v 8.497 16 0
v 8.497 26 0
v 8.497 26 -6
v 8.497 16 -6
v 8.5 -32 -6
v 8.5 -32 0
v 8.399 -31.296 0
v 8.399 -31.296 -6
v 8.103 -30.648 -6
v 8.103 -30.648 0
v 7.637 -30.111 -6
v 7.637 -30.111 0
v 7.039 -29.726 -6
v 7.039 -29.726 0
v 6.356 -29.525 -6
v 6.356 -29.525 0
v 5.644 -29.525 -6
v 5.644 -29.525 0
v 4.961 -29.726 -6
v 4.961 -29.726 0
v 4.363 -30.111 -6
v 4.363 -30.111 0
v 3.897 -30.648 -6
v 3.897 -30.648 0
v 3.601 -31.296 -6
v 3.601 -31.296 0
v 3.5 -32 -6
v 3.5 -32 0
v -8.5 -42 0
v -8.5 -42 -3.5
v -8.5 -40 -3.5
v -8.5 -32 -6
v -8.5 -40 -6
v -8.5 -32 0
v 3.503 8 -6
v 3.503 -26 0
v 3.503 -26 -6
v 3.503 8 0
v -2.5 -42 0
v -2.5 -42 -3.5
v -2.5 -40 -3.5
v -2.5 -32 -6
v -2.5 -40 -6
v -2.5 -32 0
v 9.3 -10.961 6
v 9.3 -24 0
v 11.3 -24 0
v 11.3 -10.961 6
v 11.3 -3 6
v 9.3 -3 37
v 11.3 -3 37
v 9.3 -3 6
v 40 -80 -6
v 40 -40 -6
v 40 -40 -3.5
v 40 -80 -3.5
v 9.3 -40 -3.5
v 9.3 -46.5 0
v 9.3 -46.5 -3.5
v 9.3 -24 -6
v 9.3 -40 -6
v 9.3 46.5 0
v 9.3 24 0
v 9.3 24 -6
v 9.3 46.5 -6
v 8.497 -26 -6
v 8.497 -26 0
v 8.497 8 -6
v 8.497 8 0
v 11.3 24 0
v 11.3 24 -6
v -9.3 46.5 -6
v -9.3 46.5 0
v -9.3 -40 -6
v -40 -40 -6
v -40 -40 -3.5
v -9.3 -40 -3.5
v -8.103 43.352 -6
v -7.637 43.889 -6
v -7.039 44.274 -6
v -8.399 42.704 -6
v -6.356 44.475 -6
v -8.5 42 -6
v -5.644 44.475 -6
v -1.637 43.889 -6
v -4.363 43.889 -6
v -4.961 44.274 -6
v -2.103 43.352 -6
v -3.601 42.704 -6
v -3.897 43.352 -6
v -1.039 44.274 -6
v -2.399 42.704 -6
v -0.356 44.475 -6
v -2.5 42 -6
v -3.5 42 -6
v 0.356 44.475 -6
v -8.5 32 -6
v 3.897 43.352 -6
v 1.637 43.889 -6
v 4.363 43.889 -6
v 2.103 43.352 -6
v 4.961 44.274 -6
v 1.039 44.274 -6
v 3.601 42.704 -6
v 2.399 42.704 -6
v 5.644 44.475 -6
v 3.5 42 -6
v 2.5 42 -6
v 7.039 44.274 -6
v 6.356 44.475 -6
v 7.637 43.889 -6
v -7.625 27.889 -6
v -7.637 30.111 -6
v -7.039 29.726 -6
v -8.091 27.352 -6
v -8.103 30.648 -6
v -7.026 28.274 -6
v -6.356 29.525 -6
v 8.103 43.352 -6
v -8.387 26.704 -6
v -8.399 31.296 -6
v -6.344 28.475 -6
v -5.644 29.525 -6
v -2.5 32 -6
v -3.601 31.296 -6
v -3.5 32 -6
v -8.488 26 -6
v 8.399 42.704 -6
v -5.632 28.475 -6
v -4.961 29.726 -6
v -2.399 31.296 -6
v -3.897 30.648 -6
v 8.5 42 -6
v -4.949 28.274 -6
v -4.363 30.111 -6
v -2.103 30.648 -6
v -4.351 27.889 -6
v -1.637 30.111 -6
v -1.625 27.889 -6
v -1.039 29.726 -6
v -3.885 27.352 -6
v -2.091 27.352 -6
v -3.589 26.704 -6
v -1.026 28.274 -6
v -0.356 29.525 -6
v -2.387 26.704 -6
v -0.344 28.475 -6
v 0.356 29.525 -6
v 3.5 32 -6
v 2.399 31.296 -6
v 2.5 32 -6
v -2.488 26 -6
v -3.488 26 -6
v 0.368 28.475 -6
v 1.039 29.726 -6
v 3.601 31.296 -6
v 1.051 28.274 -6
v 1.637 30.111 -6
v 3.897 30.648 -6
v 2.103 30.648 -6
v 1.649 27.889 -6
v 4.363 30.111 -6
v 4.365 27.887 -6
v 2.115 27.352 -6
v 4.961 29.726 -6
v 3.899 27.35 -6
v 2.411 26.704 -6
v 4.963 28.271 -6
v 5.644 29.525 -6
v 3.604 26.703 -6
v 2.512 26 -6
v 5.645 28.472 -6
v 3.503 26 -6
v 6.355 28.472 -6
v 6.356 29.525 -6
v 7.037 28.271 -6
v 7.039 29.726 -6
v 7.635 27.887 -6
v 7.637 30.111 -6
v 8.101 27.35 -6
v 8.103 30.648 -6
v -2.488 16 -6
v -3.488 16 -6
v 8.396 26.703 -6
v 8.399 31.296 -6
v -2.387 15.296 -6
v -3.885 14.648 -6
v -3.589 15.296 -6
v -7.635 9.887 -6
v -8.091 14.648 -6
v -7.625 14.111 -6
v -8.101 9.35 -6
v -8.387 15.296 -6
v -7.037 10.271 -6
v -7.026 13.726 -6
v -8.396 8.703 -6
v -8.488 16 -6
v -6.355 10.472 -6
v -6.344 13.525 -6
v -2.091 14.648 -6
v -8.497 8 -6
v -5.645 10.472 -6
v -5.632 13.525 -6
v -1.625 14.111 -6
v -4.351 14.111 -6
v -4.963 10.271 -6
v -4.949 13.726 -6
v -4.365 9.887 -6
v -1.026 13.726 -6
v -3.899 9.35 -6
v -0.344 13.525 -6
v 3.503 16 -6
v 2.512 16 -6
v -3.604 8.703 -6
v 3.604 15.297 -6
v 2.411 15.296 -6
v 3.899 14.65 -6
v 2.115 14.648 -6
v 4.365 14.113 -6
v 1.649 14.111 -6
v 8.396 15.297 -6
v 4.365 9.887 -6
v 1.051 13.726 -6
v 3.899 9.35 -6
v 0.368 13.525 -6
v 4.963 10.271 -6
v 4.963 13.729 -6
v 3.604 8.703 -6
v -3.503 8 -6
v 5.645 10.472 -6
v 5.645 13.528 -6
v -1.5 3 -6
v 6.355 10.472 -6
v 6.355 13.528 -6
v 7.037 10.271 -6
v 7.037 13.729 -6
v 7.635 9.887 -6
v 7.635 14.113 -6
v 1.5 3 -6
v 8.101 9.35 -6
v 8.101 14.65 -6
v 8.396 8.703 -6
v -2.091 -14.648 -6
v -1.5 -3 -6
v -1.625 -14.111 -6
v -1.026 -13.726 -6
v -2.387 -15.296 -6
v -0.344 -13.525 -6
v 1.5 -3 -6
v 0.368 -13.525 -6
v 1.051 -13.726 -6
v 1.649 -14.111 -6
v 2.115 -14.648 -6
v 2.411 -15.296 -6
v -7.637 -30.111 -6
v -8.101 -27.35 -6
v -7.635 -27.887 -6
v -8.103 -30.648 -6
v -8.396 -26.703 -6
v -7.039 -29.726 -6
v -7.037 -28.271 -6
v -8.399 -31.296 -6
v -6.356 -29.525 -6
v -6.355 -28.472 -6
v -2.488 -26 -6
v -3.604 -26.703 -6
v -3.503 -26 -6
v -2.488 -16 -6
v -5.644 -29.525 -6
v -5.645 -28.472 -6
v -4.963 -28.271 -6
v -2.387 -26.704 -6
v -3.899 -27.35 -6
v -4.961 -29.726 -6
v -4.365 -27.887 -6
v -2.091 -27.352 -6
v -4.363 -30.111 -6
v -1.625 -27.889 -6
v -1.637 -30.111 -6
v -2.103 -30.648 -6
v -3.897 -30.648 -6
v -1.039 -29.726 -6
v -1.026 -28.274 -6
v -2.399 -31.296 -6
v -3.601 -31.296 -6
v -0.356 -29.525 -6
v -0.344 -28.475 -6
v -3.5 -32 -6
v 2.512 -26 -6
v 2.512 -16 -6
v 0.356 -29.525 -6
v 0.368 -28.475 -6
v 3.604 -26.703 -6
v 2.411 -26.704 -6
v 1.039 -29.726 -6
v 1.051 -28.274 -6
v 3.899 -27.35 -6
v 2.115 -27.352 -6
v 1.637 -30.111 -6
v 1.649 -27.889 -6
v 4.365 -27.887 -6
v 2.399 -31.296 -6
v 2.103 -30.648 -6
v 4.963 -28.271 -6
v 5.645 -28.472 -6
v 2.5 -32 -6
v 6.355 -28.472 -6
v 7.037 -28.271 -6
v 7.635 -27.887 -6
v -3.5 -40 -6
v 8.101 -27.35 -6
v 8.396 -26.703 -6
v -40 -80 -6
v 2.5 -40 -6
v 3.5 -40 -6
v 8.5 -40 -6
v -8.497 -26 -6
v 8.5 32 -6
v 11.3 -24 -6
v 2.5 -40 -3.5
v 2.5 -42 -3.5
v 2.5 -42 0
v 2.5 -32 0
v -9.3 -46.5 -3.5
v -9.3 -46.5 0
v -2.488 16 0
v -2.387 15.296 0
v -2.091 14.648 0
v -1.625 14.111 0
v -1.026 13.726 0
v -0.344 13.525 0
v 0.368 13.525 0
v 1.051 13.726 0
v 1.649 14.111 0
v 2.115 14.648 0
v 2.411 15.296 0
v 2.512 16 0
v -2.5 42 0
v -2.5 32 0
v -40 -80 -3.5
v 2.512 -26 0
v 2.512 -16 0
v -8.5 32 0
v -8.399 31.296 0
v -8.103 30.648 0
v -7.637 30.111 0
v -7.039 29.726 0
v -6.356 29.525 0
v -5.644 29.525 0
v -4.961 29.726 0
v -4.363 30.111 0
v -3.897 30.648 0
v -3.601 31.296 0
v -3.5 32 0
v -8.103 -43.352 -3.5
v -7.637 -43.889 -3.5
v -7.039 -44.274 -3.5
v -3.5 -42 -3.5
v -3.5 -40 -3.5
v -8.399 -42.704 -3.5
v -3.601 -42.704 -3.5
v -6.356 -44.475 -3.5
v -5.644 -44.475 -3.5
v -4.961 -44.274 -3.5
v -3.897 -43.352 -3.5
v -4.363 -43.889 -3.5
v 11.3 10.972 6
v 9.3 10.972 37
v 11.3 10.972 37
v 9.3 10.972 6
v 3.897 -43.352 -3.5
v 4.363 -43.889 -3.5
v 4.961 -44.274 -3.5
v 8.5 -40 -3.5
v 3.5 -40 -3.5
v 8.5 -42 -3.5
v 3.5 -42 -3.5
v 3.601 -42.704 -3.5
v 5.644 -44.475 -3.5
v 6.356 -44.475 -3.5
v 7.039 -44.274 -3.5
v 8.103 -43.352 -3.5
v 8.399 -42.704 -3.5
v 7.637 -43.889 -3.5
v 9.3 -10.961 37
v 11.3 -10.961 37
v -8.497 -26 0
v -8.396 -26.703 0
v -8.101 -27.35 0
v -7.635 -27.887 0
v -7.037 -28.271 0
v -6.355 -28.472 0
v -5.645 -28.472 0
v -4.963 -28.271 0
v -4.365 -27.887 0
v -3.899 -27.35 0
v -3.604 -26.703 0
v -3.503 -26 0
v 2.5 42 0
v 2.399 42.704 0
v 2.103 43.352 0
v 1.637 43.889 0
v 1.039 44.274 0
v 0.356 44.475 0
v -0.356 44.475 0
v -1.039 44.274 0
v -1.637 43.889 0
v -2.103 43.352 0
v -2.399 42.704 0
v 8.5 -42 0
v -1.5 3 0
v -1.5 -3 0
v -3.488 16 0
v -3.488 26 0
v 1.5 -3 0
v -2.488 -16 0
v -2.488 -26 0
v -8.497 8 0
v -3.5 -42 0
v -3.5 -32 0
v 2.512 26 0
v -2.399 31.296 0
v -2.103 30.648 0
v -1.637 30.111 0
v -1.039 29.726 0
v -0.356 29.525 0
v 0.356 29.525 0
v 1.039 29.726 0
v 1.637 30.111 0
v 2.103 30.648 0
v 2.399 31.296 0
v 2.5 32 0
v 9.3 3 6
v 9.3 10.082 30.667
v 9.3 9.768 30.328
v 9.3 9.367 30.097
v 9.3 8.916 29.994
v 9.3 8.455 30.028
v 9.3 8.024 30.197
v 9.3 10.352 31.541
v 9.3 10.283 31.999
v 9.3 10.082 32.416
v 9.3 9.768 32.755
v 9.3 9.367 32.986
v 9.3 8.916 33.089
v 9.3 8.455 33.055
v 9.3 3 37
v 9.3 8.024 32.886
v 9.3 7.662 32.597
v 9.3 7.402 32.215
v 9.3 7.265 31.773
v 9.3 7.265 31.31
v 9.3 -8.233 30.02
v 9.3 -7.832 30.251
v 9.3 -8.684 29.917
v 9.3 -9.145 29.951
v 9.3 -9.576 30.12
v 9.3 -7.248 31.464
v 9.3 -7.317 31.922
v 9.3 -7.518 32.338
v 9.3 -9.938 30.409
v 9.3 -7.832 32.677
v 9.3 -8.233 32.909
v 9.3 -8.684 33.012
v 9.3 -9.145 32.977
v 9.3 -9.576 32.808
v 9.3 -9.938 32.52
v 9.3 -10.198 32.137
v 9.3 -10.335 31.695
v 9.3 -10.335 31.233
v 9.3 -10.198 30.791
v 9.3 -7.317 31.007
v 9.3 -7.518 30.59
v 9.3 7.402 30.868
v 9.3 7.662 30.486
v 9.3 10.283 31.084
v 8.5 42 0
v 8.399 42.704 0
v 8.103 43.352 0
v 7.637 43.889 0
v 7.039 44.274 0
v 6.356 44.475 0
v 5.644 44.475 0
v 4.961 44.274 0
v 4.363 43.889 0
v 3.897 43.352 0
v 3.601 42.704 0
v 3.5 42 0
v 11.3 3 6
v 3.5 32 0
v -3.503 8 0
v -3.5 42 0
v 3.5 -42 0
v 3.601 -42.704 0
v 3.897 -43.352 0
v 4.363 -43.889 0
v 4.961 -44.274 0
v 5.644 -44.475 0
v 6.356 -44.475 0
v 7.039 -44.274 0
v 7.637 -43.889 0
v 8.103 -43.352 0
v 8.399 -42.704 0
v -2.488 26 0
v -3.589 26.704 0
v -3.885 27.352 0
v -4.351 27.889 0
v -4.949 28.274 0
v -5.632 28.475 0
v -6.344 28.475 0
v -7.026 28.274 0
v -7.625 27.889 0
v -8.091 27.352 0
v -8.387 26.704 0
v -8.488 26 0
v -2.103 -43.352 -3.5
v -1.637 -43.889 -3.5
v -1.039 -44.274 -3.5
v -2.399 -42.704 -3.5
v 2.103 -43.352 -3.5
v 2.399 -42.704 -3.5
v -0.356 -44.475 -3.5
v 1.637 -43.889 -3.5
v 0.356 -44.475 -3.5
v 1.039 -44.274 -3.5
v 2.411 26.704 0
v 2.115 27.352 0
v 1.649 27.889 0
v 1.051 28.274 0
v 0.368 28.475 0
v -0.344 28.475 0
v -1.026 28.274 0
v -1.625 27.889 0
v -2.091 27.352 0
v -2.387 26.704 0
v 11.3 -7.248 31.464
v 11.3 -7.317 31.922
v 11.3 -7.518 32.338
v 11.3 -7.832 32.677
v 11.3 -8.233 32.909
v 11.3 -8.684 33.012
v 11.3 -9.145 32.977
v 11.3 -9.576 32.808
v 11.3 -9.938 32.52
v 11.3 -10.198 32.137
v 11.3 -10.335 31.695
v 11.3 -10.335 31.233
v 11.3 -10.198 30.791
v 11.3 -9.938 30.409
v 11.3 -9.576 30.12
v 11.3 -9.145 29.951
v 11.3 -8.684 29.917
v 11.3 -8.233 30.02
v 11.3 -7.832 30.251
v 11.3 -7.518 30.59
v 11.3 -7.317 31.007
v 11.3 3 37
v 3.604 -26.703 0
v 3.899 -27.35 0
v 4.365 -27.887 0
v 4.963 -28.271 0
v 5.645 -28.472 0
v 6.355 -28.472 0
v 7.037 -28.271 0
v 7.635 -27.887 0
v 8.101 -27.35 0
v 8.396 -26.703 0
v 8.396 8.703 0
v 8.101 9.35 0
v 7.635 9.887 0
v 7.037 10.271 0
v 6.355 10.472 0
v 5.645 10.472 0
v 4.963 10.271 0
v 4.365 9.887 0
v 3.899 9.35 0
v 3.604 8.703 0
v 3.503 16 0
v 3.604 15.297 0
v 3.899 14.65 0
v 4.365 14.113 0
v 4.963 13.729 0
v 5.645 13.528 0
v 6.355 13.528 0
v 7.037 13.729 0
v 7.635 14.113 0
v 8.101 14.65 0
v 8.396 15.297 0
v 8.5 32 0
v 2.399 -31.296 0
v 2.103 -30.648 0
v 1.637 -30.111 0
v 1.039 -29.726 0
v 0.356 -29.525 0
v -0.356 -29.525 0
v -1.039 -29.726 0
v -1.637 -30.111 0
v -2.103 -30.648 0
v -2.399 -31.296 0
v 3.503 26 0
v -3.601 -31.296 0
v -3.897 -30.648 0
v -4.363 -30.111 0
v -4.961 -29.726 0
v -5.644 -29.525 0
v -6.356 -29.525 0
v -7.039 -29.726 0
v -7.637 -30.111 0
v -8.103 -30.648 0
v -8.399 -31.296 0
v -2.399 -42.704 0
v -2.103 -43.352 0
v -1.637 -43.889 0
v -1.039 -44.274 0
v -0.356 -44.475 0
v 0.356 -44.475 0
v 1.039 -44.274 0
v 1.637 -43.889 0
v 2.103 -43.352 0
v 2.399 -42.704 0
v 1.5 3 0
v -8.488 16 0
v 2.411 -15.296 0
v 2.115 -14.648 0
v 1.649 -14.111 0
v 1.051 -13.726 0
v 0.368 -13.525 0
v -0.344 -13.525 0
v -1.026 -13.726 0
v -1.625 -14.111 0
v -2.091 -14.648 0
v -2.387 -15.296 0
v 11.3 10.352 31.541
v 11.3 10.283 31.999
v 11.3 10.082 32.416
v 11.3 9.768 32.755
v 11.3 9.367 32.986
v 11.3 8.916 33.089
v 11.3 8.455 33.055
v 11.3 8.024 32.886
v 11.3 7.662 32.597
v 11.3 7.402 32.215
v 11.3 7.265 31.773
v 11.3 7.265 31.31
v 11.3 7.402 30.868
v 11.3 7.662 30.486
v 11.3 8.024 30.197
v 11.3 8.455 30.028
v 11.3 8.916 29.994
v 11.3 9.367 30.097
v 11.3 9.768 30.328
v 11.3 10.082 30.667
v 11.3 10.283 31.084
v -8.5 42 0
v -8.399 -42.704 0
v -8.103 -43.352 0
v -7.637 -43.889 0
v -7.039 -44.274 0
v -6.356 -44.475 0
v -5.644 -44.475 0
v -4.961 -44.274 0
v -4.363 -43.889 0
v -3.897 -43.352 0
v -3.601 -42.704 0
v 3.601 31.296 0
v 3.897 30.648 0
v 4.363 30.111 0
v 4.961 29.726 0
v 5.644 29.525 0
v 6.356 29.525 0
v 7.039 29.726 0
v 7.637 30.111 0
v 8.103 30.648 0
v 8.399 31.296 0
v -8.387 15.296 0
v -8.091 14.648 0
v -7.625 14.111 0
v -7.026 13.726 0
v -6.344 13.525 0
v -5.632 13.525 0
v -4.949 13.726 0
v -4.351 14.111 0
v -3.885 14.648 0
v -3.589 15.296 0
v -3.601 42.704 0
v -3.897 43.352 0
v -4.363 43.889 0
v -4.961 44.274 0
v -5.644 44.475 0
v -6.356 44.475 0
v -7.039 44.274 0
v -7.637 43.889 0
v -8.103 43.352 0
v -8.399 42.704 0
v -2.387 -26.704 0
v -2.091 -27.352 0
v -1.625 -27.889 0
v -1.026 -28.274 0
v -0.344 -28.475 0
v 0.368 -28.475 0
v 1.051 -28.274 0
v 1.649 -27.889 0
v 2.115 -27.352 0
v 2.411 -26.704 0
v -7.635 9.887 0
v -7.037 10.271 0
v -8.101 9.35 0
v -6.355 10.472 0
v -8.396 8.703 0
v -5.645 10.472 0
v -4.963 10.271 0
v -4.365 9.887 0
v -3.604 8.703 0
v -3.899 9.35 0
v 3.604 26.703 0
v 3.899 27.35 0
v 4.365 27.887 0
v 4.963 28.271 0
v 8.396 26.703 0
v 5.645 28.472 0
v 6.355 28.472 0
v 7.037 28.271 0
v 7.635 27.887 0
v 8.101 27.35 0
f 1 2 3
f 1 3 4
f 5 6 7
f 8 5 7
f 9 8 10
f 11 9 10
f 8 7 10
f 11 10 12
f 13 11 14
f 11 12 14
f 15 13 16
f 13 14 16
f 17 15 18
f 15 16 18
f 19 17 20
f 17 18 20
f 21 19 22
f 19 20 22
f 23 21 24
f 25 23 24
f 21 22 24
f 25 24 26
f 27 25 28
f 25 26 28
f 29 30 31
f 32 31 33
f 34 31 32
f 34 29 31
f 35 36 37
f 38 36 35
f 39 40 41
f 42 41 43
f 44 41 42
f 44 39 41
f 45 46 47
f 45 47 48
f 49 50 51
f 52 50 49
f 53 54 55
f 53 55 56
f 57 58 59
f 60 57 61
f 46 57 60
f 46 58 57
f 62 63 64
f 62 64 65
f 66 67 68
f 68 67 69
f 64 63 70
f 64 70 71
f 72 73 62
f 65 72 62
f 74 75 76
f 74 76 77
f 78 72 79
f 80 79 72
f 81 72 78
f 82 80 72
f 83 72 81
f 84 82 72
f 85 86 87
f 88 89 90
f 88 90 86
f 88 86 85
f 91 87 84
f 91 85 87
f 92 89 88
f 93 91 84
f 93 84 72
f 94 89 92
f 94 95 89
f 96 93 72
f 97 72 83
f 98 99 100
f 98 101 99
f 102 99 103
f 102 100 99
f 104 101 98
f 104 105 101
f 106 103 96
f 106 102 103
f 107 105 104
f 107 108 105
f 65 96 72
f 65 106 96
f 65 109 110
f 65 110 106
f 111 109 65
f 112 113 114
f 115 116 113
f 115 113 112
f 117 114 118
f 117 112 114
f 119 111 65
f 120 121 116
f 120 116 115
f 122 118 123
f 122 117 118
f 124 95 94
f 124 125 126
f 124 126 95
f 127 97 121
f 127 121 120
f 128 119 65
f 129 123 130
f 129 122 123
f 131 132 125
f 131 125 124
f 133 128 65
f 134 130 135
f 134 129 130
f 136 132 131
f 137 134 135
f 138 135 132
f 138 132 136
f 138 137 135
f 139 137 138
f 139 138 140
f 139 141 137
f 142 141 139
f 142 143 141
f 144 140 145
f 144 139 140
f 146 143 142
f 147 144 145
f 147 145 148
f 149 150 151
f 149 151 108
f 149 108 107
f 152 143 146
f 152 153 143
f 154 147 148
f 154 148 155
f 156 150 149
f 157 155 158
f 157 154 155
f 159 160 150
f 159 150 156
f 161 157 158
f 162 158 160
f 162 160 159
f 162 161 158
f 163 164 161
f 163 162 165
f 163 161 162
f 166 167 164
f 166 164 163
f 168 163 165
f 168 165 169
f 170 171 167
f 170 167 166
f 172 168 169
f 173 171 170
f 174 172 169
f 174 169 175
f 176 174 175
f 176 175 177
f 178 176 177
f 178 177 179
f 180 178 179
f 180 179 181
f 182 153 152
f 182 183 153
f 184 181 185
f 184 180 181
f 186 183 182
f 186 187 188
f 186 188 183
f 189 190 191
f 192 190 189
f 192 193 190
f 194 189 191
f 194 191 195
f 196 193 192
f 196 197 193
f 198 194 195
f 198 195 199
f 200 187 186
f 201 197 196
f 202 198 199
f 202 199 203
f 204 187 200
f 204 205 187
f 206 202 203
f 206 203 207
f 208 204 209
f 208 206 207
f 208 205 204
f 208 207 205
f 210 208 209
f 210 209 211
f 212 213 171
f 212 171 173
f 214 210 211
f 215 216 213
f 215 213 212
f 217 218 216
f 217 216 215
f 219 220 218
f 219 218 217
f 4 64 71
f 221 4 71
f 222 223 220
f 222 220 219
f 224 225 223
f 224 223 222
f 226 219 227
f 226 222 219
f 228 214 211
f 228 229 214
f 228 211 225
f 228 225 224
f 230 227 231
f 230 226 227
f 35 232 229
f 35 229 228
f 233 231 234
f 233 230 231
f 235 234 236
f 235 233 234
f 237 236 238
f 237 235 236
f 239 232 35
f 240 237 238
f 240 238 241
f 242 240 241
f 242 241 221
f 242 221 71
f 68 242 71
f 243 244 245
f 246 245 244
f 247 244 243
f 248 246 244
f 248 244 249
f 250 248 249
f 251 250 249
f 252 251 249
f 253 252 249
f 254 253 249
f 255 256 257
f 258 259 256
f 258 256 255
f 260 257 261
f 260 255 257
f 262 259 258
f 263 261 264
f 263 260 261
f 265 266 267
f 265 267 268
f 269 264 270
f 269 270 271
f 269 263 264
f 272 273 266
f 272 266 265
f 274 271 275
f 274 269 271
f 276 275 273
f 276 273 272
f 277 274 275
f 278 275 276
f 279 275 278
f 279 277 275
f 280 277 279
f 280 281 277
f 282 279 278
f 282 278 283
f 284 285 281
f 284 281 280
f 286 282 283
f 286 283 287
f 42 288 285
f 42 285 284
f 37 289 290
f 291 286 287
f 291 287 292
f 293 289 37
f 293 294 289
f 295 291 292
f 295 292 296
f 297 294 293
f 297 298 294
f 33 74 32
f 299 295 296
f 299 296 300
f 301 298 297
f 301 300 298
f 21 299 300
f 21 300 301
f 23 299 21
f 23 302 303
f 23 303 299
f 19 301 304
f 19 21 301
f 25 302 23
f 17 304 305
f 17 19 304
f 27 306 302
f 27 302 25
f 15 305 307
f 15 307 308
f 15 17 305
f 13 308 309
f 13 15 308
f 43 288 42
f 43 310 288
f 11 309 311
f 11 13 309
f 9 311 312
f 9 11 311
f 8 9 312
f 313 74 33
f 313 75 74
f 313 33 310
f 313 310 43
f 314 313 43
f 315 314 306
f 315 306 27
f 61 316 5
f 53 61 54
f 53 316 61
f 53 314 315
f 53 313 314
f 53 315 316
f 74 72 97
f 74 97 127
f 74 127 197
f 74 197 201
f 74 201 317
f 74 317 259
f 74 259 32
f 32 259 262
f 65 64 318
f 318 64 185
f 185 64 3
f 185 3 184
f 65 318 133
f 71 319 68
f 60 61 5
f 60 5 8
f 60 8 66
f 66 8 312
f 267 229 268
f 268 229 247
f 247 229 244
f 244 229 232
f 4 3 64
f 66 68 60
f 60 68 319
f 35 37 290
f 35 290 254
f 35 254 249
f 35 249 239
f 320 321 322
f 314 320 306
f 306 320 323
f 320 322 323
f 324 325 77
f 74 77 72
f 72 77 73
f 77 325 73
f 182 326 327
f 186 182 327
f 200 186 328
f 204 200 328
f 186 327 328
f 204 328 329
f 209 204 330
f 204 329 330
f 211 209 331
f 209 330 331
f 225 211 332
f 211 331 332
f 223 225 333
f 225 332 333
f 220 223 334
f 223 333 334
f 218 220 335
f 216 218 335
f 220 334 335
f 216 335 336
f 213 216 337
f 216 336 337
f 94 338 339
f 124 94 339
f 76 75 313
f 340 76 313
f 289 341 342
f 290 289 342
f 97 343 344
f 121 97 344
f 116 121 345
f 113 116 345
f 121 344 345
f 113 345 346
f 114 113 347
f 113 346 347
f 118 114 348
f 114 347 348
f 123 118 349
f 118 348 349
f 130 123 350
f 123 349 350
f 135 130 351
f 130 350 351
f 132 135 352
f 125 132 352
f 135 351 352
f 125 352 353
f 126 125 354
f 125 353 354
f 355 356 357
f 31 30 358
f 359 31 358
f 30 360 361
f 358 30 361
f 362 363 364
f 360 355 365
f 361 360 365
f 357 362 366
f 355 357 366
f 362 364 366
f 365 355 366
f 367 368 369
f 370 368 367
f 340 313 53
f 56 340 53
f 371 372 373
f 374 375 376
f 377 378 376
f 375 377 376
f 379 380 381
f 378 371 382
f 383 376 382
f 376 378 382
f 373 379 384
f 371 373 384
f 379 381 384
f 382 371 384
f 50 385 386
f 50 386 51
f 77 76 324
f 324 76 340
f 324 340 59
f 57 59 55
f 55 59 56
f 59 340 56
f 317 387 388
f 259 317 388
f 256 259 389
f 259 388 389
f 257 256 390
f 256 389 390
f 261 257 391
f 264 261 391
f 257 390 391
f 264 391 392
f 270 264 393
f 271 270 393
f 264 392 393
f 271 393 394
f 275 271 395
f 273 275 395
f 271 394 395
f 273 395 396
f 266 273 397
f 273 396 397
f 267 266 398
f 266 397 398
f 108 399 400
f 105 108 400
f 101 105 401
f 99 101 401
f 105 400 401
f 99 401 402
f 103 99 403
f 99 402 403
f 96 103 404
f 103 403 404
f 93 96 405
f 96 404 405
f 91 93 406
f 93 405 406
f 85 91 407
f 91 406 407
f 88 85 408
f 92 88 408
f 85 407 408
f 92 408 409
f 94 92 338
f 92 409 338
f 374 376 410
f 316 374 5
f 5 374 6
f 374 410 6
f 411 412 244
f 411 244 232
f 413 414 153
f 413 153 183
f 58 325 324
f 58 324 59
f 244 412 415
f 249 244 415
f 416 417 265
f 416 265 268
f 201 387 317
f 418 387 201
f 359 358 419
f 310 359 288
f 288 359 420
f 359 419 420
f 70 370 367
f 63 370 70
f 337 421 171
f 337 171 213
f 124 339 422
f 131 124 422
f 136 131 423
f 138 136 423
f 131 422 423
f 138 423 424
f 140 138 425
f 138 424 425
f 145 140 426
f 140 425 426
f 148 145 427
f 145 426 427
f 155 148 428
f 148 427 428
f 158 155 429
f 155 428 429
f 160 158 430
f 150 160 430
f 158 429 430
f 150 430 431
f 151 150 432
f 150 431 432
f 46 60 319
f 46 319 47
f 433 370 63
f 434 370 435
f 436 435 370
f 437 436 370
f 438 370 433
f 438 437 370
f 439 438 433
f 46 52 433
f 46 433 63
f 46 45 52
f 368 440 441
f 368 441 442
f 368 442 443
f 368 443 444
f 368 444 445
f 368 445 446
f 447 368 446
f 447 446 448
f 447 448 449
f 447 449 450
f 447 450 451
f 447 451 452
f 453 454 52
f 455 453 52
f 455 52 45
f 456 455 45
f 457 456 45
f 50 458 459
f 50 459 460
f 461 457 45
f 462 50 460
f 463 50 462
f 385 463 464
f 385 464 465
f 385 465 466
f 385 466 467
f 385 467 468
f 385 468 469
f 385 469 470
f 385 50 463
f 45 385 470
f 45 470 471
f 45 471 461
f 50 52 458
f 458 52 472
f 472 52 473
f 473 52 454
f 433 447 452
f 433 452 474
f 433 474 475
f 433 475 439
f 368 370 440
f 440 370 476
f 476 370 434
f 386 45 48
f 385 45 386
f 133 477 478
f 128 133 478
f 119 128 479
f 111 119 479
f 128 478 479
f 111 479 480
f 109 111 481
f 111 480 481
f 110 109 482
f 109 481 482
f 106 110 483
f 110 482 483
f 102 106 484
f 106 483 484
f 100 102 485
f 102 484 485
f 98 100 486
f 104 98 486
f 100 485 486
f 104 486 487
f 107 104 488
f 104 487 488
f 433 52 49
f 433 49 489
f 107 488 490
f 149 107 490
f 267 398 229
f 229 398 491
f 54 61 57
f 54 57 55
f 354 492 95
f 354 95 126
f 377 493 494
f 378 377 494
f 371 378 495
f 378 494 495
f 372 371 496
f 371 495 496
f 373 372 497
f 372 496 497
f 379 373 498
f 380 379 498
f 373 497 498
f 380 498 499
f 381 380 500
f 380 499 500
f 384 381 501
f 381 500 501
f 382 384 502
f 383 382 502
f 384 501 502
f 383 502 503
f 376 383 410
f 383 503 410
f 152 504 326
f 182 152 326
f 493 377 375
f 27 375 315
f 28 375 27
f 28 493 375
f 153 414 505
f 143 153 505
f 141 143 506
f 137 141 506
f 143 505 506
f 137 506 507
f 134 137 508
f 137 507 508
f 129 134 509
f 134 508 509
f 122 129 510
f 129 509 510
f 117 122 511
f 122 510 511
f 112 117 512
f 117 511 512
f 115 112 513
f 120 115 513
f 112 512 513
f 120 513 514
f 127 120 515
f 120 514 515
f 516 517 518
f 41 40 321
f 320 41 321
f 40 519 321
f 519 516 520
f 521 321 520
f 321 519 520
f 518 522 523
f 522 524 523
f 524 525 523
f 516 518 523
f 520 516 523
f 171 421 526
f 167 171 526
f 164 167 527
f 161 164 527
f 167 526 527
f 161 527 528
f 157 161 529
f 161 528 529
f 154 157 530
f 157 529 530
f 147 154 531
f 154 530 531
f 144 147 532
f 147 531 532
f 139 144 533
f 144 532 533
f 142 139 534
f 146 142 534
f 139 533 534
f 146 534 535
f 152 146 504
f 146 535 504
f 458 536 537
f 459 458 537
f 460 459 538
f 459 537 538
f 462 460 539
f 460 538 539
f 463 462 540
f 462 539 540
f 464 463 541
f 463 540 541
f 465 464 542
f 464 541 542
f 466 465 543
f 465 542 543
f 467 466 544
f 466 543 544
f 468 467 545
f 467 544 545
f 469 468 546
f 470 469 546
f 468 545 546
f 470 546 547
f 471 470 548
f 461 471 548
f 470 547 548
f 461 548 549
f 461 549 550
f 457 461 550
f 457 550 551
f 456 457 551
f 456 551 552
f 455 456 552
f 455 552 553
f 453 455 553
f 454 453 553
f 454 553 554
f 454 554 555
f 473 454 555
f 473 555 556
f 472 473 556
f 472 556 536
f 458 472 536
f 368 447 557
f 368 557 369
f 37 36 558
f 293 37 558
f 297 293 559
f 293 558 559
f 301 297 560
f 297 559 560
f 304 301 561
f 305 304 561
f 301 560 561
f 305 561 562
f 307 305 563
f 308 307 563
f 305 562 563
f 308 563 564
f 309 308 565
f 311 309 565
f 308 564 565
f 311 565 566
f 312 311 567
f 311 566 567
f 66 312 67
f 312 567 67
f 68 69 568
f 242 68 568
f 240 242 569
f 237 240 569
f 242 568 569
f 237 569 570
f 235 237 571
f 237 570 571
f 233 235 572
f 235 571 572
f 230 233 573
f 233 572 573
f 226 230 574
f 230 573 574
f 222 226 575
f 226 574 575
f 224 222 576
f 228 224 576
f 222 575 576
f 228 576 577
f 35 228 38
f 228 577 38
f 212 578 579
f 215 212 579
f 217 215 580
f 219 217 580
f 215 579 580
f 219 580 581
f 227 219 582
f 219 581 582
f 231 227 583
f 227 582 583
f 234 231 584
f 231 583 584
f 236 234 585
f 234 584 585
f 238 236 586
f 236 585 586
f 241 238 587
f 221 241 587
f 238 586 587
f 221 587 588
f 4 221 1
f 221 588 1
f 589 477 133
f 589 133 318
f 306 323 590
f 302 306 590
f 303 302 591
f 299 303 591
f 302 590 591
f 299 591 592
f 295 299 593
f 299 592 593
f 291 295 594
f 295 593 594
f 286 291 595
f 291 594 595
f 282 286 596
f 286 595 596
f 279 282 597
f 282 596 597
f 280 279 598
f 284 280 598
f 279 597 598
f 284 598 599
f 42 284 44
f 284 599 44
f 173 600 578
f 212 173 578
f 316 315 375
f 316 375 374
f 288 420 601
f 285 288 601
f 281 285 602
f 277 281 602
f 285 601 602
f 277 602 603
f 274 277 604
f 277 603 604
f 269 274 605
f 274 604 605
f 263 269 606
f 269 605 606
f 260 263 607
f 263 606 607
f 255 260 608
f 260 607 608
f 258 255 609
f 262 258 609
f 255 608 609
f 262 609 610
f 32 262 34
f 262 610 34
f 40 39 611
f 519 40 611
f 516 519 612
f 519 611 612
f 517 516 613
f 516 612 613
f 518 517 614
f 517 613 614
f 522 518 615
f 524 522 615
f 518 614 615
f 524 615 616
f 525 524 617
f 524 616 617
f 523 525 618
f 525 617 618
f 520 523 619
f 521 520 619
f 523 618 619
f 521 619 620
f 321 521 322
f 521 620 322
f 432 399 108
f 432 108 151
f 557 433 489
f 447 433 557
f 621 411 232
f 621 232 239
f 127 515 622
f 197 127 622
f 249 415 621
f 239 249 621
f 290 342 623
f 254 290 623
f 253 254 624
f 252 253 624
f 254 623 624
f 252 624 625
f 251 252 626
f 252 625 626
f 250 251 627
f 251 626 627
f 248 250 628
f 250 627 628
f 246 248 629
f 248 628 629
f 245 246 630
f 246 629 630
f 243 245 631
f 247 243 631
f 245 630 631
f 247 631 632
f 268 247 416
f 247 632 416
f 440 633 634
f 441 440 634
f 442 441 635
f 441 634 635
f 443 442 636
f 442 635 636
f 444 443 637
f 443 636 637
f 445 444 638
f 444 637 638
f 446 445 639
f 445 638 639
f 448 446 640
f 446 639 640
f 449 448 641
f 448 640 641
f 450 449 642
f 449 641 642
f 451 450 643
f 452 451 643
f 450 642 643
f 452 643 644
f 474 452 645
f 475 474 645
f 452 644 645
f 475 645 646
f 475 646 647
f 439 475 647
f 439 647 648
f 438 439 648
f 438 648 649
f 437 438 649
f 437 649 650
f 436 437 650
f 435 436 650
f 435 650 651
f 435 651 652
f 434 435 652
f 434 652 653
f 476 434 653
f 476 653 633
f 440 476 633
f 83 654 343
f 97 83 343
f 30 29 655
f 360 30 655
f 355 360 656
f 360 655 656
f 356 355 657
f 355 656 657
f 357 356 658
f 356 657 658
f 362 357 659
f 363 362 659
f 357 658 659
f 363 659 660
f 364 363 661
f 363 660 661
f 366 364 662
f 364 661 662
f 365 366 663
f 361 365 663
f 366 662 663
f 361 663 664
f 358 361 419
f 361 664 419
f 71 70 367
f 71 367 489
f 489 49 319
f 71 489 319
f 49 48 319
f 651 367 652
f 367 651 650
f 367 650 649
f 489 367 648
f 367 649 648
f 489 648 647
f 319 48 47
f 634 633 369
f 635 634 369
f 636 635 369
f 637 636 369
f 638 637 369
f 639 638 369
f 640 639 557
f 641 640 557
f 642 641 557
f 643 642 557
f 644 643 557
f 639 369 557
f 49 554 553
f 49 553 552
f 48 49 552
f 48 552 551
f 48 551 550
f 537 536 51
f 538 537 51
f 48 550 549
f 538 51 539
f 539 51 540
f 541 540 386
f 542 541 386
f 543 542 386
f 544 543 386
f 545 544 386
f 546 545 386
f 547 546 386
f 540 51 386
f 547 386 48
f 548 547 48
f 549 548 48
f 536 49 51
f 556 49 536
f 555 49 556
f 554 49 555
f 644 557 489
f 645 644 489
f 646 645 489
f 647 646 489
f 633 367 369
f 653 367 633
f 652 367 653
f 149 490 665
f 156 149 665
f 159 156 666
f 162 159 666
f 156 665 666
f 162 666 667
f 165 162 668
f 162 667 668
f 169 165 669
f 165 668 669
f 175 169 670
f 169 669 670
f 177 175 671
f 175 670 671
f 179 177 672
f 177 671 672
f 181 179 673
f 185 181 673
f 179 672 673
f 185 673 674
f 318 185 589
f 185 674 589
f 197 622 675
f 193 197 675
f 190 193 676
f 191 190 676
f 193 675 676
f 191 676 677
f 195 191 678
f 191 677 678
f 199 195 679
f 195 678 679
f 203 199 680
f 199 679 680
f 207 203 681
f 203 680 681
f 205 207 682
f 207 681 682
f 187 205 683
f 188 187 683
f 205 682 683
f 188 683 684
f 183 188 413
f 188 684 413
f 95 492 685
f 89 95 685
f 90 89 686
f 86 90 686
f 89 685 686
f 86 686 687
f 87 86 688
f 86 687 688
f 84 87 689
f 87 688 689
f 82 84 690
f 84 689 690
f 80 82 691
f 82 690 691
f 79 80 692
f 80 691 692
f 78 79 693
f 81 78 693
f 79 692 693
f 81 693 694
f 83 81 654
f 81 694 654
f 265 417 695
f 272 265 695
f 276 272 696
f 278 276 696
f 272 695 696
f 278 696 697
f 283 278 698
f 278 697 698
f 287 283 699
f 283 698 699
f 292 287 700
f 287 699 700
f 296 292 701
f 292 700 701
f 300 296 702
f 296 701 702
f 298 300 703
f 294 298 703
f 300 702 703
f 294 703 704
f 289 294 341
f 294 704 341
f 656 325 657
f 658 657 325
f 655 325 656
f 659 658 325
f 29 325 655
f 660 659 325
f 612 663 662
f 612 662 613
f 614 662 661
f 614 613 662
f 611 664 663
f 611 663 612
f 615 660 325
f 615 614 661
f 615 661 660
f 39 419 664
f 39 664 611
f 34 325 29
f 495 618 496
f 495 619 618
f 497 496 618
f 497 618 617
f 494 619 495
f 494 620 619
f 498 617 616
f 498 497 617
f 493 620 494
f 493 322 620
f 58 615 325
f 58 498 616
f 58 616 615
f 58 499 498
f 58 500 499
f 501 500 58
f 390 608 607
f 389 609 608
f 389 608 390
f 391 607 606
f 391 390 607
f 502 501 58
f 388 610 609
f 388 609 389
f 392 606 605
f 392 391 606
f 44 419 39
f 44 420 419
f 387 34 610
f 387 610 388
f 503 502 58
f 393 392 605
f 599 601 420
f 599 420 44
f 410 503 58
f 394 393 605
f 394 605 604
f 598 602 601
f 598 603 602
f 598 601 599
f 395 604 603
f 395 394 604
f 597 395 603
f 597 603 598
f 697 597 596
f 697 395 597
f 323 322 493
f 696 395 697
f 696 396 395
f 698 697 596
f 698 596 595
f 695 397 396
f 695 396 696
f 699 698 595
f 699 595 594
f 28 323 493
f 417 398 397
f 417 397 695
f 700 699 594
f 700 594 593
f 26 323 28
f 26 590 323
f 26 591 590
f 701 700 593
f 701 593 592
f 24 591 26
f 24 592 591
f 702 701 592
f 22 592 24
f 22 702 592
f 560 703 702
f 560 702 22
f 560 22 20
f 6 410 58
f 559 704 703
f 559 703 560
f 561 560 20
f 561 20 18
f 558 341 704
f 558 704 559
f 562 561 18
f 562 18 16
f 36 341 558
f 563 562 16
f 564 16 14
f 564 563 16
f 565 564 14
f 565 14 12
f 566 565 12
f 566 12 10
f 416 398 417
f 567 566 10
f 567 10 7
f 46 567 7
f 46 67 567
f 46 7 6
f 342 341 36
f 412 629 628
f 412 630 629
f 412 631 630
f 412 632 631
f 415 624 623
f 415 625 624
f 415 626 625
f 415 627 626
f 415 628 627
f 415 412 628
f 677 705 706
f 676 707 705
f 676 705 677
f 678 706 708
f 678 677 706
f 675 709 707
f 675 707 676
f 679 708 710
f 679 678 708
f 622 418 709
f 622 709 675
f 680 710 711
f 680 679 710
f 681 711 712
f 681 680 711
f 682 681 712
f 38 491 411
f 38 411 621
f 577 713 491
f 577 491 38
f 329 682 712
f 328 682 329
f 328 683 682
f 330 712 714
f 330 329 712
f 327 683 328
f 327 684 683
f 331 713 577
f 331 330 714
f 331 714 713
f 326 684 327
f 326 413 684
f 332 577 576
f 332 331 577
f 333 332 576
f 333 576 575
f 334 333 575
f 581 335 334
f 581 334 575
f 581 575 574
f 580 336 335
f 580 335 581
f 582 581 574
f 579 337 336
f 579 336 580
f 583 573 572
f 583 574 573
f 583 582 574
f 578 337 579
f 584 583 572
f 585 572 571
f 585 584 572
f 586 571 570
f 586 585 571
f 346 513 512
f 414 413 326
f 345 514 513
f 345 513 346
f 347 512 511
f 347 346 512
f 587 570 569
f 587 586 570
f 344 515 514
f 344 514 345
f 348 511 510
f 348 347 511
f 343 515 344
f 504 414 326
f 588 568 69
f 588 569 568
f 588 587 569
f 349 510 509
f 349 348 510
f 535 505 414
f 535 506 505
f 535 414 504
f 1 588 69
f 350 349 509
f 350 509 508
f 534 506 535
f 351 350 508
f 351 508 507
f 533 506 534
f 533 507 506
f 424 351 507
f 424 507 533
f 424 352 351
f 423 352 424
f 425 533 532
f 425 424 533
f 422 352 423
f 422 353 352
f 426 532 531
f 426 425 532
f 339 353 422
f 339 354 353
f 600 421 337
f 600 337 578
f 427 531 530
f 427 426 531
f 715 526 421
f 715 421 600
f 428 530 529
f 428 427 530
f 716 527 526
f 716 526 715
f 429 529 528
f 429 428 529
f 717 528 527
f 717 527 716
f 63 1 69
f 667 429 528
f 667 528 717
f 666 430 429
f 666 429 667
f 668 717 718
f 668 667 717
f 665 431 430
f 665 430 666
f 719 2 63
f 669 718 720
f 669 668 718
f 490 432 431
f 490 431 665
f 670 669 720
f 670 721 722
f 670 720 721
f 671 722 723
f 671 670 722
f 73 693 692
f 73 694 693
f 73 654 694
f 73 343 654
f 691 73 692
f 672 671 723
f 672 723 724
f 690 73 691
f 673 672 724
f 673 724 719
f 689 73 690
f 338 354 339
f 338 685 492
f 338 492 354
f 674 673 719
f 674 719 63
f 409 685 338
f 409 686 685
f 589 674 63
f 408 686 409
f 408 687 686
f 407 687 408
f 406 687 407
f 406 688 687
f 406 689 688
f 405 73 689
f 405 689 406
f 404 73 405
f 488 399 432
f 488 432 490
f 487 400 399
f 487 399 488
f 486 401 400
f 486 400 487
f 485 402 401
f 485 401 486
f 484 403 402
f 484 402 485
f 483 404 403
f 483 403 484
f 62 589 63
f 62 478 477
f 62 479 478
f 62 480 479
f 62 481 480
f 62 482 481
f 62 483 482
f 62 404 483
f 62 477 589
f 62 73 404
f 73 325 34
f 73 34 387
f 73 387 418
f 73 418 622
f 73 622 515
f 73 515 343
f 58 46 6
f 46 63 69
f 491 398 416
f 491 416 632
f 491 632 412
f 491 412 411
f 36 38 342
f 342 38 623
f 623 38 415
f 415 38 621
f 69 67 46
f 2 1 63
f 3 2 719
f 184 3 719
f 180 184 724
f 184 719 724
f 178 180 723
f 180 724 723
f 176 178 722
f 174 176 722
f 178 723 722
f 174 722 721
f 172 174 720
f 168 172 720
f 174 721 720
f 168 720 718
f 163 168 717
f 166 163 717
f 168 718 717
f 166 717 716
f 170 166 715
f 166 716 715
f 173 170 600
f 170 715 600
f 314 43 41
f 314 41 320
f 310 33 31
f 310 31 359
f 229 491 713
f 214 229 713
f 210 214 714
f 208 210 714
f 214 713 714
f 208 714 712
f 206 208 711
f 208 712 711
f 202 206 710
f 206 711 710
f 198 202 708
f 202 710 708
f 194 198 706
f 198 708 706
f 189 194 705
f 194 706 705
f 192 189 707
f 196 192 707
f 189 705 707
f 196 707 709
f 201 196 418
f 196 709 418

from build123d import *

# Parameters (mm, degrees)
SKETCH_W        = 18.6
SKETCH_H        = 93
PAD_DEPTH       = 6
SKETCH001_W     = 3
SKETCH001_H     = 6
POCKET_DEPTH    = 6
POCKET001_DEPTH = 8
PAD001_DEPTH    = 2
SKETCH004_R     = 1.551846
SKETCH004_R_2   = 1.552141
POCKET002_DEPTH = 55
SKETCH005_W     = 80
SKETCH005_H     = 40
PAD002_DEPTH    = 2.5


with BuildPart() as part:
    # Sketch → Pad (new body)
    with BuildSketch(Plane.XY):
        Rectangle(SKETCH_W, SKETCH_H)
    extrude(amount=-PAD_DEPTH)

    # Sketch001 (on Face5 of Pad) → Pocket (cut)
    with BuildSketch(Plane.XY):
        Rectangle(SKETCH001_W, SKETCH001_H)
    extrude(amount=-POCKET_DEPTH, mode=Mode.SUBTRACT)

    # Sketch002 (on Face4 of Pocket) → Pocket001 (cut)
    with BuildSketch(Plane.XY):
        with BuildLine():
            ThreePointArc((-2.5, -42), (0, -44.5), (2.5, -42))
            Line((2.5, -42), (2.5, -32))
            ThreePointArc((2.5, -32), (0, -29.5), (-2.5, -32))
            Line((-2.5, -42), (-2.5, -32))
        make_face()
        with BuildLine():
            ThreePointArc((-8.5, -42), (-6, -44.5), (-3.5, -42))
            Line((-3.5, -42), (-3.5, -32))
            ThreePointArc((-3.5, -32), (-6, -29.5), (-8.5, -32))
            Line((-8.5, -42), (-8.5, -32))
        make_face()
        with BuildLine():
            ThreePointArc((3.5, -42), (6, -44.5), (8.5, -42))
            Line((8.5, -42), (8.5, -32))
            ThreePointArc((8.5, -32), (6, -29.5), (3.5, -32))
            Line((3.5, -42), (3.5, -32))
        make_face()
        with BuildLine():
            ThreePointArc((-2.487782, -26), (0.012218, -28.5), (2.512218, -26))
            Line((2.512218, -26), (2.512218, -16))
            ThreePointArc((2.512218, -16), (0.012218, -13.5), (-2.487782, -16))
            Line((-2.487782, -26), (-2.487782, -16))
        make_face()
        with BuildLine():
            ThreePointArc((-8.496945, -26), (-6, -28.496945), (-3.503055, -26))
            Line((-3.503055, -26), (-3.503055, 8))
            ThreePointArc((-3.503055, 8), (-6, 10.496945), (-8.496945, 8))
            Line((-8.496945, -26), (-8.496945, 8))
        make_face()
        with BuildLine():
            ThreePointArc((3.503055, -26), (6, -28.496945), (8.496945, -26))
            Line((8.496945, -26), (8.496945, 8))
            ThreePointArc((8.496945, 8), (6, 10.496945), (3.503055, 8))
            Line((3.503055, -26), (3.503055, 8))
        make_face()
        with BuildLine():
            ThreePointArc((2.5, 42), (0, 44.5), (-2.5, 42))
            Line((-2.5, 42), (-2.5, 32))
            ThreePointArc((-2.5, 32), (0, 29.5), (2.5, 32))
            Line((2.5, 42), (2.5, 32))
        make_face()
        with BuildLine():
            ThreePointArc((-3.5, 42), (-6, 44.5), (-8.5, 42))
            Line((-8.5, 42), (-8.5, 32))
            ThreePointArc((-8.5, 32), (-6, 29.5), (-3.5, 32))
            Line((-3.5, 42), (-3.5, 32))
        make_face()
        with BuildLine():
            ThreePointArc((8.5, 42), (6, 44.5), (3.5, 42))
            Line((3.5, 42), (3.5, 32))
            ThreePointArc((3.5, 32), (6, 29.5), (8.5, 32))
            Line((8.5, 42), (8.5, 32))
        make_face()
        with BuildLine():
            ThreePointArc((2.512218, 26), (0.012218, 28.5), (-2.487782, 26))
            Line((-2.487782, 26), (-2.487782, 16))
            ThreePointArc((-2.487782, 16), (0.012218, 13.5), (2.512218, 16))
            Line((2.512218, 26), (2.512218, 16))
        make_face()
        with BuildLine():
            ThreePointArc((-3.487782, 26), (-5.987782, 28.5), (-8.487782, 26))
            Line((-8.487782, 26), (-8.487782, 16))
            ThreePointArc((-8.487782, 16), (-5.987782, 13.5), (-3.487782, 16))
            Line((-3.487782, 26), (-3.487782, 16))
        make_face()
        with BuildLine():
            ThreePointArc((8.496945, 26), (6, 28.496945), (3.503055, 26))
            Line((3.503055, 26), (3.503055, 16))
            ThreePointArc((3.503055, 16), (6, 13.503055), (8.496945, 16))
            Line((8.496945, 26), (8.496945, 16))
        make_face()
    extrude(amount=-POCKET001_DEPTH, mode=Mode.SUBTRACT)

    # Sketch003 (on Face3 of Pocket001) → Pad001 (join)
    with BuildSketch(Plane.YZ.offset(9.3)):
        Polygon((-24, -6), (-24, 0), (-10.960923, 6), (-10.960923, 37), (-3, 37), (-3, 6), (3, 6), (3, 37), (10.971753, 37), (10.971753, 6), (24, 0), (24, -6), align=None)
    extrude(amount=PAD001_DEPTH)

    # Sketch004 → Pocket002 (cut)
    with BuildSketch(Plane.YZ.offset(11.3)):
        with Locations((-8.8, 31.464135)):
            Circle(SKETCH004_R)
        with Locations((8.8, 31.541361)):
            Circle(SKETCH004_R_2)
    extrude(amount=-POCKET002_DEPTH, mode=Mode.SUBTRACT)

    # Sketch005 (on Face5 of Pocket002) → Pad002 (join)
    with BuildSketch(Plane(origin=(0, 0, -6), x_dir=(1, 0, 0), z_dir=(0, 0, -1))):
        with Locations((0, 60)):
            Rectangle(SKETCH005_W, SKETCH005_H)
    extrude(amount=-PAD002_DEPTH)


solid = part.part
